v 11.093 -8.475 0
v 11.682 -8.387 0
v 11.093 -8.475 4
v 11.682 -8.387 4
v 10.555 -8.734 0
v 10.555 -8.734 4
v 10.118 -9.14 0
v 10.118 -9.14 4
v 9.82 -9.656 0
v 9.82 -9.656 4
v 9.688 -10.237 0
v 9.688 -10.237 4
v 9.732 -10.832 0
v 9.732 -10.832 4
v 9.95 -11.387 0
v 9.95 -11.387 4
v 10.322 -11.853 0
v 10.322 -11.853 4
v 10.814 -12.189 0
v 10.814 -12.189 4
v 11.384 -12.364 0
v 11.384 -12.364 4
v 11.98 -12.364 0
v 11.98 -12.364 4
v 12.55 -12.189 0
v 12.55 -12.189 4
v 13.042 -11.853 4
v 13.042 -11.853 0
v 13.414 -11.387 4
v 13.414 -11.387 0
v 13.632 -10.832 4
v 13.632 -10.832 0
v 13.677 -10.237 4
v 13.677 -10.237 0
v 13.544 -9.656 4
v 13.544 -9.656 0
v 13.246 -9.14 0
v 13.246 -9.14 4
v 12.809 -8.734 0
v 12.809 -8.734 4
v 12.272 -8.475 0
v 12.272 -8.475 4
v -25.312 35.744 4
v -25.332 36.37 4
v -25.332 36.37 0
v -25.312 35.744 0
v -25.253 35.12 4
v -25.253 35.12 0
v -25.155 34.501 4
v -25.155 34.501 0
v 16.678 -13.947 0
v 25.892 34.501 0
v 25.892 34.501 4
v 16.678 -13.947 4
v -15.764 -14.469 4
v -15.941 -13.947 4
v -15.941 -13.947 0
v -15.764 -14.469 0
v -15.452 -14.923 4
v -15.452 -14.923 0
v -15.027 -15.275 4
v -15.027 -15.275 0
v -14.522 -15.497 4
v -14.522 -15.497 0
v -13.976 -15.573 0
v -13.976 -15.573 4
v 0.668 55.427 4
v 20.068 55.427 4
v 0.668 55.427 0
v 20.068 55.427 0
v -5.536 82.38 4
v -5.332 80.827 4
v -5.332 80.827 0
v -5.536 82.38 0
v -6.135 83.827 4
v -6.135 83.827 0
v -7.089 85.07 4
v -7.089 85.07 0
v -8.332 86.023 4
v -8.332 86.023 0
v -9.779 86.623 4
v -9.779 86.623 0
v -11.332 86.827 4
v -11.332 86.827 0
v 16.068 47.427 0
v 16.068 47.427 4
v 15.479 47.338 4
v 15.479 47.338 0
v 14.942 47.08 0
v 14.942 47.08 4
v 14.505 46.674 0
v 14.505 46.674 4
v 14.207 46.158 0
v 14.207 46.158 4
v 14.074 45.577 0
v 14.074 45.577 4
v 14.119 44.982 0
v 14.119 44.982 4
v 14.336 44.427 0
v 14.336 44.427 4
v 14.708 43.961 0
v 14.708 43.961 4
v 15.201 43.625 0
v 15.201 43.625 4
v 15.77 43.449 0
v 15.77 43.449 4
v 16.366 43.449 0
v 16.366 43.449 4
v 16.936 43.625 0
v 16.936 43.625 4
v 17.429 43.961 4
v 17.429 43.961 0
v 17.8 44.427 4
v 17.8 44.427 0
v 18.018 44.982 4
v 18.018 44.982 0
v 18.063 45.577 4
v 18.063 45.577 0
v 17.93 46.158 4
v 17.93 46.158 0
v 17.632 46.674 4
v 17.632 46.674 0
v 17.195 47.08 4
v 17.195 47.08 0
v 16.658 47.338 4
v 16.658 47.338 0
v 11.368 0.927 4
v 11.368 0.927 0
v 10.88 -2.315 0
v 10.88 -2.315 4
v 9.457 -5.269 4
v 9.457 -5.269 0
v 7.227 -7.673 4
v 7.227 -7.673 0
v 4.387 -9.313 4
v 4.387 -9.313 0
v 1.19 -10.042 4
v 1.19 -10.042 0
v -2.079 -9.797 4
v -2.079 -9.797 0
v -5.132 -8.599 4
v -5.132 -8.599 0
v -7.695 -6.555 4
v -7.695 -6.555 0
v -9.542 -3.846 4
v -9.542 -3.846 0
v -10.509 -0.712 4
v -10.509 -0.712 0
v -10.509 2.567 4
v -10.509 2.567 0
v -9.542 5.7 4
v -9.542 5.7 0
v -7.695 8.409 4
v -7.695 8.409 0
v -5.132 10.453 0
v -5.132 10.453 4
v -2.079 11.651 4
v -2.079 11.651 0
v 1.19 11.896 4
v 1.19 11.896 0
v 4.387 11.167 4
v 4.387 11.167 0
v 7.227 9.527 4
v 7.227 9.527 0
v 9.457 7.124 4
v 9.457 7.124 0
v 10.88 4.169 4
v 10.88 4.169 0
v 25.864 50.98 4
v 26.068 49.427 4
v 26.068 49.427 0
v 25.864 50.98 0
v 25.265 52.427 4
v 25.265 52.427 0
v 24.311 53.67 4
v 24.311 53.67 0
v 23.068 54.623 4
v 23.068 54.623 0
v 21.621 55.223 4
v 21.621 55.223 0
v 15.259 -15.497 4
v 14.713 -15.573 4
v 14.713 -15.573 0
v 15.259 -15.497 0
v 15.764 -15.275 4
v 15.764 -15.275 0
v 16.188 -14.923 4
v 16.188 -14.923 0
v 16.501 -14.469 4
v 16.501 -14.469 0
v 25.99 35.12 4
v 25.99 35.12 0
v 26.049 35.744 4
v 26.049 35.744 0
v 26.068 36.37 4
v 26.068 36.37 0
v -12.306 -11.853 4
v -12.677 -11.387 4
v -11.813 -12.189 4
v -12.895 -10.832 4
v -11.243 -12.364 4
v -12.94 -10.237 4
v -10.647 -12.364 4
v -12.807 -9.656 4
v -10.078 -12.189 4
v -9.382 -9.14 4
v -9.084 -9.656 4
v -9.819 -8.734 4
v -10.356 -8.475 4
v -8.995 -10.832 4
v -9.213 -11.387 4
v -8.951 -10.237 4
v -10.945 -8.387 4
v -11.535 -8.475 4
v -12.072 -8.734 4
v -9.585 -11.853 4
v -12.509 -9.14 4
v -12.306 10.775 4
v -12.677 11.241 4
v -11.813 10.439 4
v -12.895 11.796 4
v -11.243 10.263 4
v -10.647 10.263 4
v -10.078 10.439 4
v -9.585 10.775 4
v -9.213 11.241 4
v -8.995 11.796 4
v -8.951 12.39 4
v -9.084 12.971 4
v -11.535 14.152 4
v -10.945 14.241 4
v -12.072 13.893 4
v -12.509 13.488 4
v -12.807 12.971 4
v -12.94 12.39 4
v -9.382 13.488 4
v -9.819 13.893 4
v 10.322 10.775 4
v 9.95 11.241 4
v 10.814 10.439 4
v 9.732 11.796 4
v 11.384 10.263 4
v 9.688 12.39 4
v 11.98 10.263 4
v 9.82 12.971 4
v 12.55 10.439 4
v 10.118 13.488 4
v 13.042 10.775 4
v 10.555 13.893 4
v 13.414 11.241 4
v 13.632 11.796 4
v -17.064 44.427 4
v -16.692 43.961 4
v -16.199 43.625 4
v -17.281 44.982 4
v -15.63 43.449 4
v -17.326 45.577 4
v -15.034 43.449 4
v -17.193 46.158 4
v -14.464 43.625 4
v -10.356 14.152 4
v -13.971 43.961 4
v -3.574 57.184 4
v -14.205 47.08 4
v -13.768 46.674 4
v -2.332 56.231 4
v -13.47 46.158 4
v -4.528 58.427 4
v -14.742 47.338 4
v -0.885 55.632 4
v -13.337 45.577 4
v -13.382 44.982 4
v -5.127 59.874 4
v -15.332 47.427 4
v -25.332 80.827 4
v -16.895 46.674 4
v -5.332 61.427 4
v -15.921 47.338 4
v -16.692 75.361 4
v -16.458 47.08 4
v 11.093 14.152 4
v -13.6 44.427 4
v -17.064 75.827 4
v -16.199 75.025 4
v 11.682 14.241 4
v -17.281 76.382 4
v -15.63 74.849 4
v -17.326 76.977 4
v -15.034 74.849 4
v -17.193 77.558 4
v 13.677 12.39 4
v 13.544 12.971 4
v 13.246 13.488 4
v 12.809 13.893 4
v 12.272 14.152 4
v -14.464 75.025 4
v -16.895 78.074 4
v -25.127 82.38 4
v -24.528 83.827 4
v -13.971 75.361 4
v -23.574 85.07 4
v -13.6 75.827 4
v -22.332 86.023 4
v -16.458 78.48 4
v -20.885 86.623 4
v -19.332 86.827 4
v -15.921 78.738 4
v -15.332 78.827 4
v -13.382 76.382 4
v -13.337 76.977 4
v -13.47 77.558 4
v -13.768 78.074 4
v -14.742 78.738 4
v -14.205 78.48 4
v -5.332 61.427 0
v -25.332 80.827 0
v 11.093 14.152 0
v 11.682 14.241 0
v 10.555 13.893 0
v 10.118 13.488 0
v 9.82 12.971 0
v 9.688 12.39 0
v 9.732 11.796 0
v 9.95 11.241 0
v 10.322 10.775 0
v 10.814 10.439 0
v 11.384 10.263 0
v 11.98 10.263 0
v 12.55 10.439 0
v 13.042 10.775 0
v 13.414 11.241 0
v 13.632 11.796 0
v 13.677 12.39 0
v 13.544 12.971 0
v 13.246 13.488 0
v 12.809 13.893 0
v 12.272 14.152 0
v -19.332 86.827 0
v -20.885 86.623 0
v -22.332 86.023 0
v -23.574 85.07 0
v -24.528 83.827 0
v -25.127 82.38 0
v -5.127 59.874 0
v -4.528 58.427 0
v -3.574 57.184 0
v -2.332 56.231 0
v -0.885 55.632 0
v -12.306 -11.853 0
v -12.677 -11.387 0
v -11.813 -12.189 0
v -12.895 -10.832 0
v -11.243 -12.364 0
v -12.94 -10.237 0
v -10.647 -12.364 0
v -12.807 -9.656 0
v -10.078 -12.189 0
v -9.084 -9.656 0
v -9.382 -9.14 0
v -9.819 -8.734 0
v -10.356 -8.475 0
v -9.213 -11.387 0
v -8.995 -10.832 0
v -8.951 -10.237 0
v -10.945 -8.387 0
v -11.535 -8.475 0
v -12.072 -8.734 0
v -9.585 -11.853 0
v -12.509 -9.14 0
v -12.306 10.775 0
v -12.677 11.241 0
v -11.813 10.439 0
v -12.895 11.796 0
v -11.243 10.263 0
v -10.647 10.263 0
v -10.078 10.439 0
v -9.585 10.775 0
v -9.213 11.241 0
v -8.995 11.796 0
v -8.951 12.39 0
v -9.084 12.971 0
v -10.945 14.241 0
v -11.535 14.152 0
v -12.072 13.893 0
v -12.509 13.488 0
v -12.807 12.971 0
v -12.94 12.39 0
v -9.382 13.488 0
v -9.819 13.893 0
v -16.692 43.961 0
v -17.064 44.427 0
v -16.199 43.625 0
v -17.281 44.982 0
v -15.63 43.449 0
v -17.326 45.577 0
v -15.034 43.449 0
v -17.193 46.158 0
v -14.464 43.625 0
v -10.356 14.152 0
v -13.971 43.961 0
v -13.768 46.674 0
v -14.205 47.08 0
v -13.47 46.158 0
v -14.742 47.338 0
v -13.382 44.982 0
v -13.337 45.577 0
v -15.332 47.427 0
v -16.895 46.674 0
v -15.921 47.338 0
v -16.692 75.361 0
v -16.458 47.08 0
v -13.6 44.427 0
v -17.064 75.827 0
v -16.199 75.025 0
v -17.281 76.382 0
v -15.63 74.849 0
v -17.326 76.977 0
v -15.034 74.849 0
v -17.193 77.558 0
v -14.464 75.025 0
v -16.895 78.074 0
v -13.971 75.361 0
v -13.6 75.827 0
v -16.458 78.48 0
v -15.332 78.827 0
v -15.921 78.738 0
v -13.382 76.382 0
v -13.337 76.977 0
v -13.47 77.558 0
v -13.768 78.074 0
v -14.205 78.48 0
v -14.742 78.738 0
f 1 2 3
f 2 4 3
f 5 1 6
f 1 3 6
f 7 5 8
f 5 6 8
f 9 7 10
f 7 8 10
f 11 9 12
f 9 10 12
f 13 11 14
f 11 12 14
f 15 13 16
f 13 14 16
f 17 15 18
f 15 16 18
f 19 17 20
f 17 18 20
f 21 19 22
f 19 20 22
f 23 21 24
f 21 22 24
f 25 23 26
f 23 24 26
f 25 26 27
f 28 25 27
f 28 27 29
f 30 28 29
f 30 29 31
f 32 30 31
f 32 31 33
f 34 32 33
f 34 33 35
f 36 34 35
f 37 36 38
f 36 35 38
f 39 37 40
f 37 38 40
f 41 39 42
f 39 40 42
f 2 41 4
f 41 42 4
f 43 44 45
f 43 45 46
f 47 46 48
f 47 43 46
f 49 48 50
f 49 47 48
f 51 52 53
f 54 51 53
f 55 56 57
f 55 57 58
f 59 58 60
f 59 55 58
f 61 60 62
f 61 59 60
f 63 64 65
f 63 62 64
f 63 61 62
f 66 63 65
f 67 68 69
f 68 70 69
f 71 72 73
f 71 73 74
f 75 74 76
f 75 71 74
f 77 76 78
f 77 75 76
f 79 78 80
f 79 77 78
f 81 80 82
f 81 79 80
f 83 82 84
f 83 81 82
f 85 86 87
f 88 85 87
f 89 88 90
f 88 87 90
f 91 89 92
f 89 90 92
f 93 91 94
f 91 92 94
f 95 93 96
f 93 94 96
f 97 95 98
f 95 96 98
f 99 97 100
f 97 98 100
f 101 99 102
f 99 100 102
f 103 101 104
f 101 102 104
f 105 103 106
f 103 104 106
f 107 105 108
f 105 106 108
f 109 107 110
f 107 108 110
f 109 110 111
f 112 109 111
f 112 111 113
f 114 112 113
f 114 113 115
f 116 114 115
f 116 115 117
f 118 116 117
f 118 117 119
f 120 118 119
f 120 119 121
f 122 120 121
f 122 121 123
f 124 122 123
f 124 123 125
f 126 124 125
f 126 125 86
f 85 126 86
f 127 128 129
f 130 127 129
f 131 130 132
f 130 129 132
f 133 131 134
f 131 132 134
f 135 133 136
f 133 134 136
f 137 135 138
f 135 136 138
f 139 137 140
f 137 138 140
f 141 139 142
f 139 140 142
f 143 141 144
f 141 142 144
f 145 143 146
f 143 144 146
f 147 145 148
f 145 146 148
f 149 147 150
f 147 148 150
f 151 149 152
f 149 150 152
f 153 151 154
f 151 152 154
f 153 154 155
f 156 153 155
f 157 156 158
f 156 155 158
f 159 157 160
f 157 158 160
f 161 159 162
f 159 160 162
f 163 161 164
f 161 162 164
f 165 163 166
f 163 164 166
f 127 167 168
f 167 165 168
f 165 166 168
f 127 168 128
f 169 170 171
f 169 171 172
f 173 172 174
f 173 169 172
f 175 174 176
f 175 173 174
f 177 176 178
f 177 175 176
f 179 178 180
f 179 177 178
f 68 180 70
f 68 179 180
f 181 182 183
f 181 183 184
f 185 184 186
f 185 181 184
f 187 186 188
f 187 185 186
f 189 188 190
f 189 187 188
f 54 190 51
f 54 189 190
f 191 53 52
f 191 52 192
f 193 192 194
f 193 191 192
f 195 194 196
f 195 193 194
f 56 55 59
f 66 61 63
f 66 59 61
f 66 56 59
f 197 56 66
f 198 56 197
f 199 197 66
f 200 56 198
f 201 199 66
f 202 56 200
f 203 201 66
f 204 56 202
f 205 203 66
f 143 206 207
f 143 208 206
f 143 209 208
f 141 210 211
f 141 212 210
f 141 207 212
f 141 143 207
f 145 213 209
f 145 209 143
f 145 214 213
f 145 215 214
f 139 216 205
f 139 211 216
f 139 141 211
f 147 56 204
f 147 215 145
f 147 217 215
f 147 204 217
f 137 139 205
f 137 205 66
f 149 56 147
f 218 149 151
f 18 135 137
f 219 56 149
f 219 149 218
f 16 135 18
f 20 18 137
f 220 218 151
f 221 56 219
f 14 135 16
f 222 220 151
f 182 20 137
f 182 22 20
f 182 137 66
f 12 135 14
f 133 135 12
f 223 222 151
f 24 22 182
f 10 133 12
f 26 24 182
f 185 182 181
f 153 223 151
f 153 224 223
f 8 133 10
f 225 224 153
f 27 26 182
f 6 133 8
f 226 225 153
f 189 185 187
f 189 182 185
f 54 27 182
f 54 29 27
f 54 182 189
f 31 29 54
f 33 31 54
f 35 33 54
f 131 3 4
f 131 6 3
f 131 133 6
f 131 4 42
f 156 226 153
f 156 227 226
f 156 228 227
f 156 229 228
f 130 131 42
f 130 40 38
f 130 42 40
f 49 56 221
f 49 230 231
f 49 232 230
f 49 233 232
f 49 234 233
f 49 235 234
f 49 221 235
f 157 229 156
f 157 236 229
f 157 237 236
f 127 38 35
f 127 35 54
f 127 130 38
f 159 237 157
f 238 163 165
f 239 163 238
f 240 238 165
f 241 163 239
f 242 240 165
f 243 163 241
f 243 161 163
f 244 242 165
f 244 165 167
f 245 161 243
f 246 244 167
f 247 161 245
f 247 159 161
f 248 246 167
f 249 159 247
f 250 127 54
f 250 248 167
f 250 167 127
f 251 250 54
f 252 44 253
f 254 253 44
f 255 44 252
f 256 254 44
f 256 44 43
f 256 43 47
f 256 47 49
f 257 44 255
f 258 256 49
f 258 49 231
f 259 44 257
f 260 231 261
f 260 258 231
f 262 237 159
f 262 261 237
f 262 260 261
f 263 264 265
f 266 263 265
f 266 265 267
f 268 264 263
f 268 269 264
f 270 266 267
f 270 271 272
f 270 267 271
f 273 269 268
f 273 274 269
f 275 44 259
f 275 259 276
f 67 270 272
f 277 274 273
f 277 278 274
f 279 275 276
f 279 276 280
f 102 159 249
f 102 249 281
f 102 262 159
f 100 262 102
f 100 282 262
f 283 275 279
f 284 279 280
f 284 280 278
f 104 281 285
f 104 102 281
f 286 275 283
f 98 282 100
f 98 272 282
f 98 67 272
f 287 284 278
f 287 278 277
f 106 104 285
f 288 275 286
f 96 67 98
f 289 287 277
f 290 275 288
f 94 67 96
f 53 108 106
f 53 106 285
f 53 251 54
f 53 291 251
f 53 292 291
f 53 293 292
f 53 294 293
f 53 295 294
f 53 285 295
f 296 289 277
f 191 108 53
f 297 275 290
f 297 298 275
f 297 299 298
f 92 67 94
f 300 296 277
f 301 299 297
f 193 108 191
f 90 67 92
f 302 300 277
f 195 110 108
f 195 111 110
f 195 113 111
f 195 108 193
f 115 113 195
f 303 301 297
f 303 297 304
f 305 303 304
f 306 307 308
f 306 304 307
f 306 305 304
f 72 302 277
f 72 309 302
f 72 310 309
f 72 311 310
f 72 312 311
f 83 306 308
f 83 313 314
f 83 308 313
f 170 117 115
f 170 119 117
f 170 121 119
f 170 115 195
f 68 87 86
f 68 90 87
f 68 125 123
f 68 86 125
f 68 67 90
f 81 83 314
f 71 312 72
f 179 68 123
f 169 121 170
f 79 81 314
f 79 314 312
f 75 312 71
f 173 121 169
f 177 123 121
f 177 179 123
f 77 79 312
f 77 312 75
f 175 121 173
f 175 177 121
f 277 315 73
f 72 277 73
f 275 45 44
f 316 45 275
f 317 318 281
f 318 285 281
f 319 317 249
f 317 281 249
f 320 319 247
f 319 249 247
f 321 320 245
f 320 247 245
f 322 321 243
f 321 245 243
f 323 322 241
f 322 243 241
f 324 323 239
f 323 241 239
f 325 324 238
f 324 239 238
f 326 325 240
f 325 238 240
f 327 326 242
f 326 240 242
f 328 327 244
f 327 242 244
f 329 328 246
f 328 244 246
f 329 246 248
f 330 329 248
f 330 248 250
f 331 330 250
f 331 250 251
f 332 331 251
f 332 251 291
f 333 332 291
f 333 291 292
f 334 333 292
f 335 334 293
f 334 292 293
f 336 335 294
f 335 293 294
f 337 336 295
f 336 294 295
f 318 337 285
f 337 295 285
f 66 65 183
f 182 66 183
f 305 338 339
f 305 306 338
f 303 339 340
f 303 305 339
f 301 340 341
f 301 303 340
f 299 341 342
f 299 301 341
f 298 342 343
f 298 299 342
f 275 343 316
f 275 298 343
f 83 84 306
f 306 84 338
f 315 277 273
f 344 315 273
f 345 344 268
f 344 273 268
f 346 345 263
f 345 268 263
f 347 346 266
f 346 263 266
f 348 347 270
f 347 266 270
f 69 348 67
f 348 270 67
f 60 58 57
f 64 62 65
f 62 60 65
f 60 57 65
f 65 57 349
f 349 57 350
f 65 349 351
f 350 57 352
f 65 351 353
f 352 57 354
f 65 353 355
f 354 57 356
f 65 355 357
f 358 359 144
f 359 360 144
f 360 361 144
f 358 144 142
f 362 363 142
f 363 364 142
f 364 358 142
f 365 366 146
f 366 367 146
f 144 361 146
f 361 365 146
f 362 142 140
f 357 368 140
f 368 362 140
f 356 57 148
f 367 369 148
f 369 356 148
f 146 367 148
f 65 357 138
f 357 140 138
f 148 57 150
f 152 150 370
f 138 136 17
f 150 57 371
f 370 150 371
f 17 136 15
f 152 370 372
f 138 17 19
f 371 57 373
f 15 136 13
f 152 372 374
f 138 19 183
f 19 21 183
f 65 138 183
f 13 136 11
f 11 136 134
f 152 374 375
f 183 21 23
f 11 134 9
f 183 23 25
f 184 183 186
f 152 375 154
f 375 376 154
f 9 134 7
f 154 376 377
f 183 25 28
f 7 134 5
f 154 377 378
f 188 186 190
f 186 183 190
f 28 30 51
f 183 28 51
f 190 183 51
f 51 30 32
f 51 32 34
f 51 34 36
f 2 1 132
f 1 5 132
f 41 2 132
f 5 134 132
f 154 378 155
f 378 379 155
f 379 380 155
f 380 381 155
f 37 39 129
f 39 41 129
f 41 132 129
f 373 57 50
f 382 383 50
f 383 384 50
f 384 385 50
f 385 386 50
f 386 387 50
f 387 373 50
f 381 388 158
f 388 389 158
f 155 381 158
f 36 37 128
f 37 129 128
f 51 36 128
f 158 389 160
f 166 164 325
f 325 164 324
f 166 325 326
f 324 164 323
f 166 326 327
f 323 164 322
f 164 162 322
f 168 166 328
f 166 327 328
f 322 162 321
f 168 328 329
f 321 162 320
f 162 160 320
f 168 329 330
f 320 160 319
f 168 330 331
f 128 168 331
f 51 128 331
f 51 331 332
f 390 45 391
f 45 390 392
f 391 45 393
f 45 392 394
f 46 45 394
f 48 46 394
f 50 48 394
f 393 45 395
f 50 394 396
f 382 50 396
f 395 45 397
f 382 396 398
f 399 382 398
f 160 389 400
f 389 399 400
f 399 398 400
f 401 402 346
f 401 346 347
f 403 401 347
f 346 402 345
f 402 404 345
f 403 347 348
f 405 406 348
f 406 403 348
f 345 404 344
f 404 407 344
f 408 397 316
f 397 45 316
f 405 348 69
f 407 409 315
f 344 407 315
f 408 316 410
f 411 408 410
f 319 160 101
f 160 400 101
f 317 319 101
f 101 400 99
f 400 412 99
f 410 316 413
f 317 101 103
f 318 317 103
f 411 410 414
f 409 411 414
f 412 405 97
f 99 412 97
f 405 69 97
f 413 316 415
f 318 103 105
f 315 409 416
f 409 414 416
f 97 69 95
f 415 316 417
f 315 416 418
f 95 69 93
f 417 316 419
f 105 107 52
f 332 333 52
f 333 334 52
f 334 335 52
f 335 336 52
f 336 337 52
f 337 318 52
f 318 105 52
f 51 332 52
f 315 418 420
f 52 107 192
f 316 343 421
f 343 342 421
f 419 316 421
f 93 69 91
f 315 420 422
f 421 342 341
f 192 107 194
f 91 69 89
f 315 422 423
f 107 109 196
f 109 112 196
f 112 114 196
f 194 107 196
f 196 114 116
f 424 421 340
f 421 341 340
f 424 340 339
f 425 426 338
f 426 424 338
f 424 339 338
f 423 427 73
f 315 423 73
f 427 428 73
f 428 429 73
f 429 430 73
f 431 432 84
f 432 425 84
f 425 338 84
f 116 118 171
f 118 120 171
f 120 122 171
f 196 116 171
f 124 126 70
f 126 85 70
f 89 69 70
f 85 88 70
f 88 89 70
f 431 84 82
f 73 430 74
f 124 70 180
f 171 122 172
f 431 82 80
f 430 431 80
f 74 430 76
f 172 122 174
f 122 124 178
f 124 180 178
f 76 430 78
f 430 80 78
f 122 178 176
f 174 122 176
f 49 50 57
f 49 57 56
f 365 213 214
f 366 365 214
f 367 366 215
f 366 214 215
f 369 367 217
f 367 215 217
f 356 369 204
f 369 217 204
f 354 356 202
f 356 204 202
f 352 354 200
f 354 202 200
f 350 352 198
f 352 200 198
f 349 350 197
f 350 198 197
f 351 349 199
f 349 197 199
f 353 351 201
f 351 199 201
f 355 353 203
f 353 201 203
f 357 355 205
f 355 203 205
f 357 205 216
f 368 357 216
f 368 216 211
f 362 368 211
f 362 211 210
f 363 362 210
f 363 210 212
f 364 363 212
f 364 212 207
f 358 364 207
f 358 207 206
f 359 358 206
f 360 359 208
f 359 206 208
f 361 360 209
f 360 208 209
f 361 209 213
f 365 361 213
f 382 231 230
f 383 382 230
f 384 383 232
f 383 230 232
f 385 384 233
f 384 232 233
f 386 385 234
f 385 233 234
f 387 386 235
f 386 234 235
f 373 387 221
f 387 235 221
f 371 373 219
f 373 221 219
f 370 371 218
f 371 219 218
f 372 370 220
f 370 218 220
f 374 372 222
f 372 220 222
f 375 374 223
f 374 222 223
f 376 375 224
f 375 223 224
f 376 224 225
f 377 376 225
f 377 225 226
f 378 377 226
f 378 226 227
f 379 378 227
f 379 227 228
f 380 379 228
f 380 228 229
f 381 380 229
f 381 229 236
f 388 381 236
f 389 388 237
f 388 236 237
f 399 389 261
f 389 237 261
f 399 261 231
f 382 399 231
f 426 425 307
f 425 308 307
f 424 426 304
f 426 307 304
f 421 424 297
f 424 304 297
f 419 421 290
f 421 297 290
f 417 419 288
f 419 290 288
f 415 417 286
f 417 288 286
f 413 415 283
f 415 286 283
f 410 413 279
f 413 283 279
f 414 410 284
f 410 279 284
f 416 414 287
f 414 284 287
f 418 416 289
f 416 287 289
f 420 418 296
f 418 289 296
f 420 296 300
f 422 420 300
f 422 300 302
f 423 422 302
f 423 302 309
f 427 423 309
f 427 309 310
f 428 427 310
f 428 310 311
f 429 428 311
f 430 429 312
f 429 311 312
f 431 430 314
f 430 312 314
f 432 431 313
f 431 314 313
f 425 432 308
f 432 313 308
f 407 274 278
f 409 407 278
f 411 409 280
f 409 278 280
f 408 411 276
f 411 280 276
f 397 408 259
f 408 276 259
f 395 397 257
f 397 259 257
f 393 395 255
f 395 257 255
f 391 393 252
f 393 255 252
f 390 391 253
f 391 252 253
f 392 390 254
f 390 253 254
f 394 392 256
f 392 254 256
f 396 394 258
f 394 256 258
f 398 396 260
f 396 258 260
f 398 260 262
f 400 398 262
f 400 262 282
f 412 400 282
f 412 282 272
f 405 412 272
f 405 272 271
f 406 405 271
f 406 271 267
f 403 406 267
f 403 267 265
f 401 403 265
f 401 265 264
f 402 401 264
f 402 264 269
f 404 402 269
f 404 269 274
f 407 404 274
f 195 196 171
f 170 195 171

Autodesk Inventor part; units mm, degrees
ref_plane "YZ Plane" through (0, 0, 0) normal (1, 0, 0) x (0, 1, 0)
ref_plane "XZ Plane" through (0, 0, 0) normal (0, 1, 0) x (-1, 0, 0)
ref_plane "XY Plane" through (0, 0, 0) normal (0, 0, 1) x (1, 0, 0)
sketch "Szkic1" plane through (0, 0, 0) normal (0, 0, 1) x (1, 0, 0)
  line L0 (-25.3316, -15.5729) -> (26.0684, -15.5729)
  line L1 (26.0684, -15.5729) -> (26.0684, 35.4271)
  line L2 (26.0684, 35.4271) -> (26.0684, 35.4271)
  line L3 (26.0684, 35.4271) -> (26.0684, 55.4271)
  line L4 (26.0684, 55.4271) -> (-5.3316, 55.4271)
  line L5 (-5.3316, 55.4271) -> (-5.3316, 86.8271)
  line L6 (-5.3316, 86.8271) -> (-25.3316, 86.8271)
  line L7 (-25.3316, -15.5729) -> (-25.3316, 86.8271)
  line L8 (-15.6316, 16.9271) -> (16.3684, 16.9271)
  line L9 (16.3684, 16.9271) -> (16.3684, -15.0729)
  line L10 (16.3684, -15.0729) -> (-15.6316, -15.0729)
  line L11 (-15.6316, -15.0729) -> (-15.6316, 16.9271)
  circle A0 centre (0.3684, 0.9271) radius 11
  circle A1 centre (0.3684, 0.9271) radius 16
  point P0 (0, 0)
  point P1 (-10.9453, 12.2408)
  point P2 (11.6821, 12.2408)
  point P3 (11.6821, -10.3866)
  point P4 (-10.9453, -10.3866)
  point P5 (16.0684, 45.4271)
  point P6 (-15.3316, 76.8271)
  point P7 (-15.3316, 45.4271)
  dimension "d0" = 20
  dimension "d1" = 20
  dimension "d2" = 51.4
  dimension "d3" = 51.4
  dimension "d4" = 34.5
  dimension "d5" = 25.7
  dimension "d6" = 51.4
  dimension "d7" = 51
  dimension "d8" = 32
  dimension "d9" = 32
  dimension "d10" = 16
  dimension "d11" = 16
  dimension "d12" = 22
  dimension "d13" = 32
  dimension "d23" = 10
  dimension "d24" = 10
  dimension "d25" = 10
  dimension "d26" = 10
  dimension "d27" = 10
  dimension "d28" = 10
extrude "Wyciągnięcie proste1" add sketch "Szkic1" along normal blind 4 contours L7 L6 L5 L4 L3 L1 L0 | L8 A1 L11 | L8 L9 A1 | A1 | A1 L10 L11 | L9 L10 A1
hole "Otwór1" at (0.3684, 0.9271, 0) at (-10.9453, 12.2408, 0) at (11.6821, 12.2408, 0) at (11.6821, -10.3866, 0) at (-10.9453, -10.3866, 0) direction (0, 0, 1) diameter 4 end through all
hole "Otwór2" at (16.0684, 45.4271, 0) at (-15.3316, 76.8271, 0) at (-15.3316, 45.4271, 0) direction (0, 0, 1) diameter 4 end through all
chamfer "Faza1" distance 51 distance2 9.7 1 edges at (-25.3316, -15.5729, 2) measured on face at (-25.3316, 18.5605, 1.3333)
chamfer "Faza2" distance 51 distance2 9.7 1 edges at (26.0684, -15.5729, 2) measured on face at (26.0684, 31.7605, 1.3333)
fillet "Zaokrąglenie1" radius 2 2 edges at (-15.6316, -15.5729, 2) (16.3684, -15.5729, 2)
fillet "Zaokrąglenie2" radius 6 4 edges at (-5.3316, 55.4271, 2) (26.0684, 55.4271, 2) (-5.3316, 86.8271, 2) (-25.3316, 86.8271, 2)
fillet "Zaokrąglenie3" radius 10 2 edges at (-25.3316, 35.4271, 2) (26.0684, 35.4271, 2)
equation "\"d1\" = d0"
equation "\"d2\" = d6"
equation "\"d3\" = d6"
equation "\"d6\" = 2 * d5"
equation "\"d10\" = 0.5 * d9"
equation "\"d11\" = 0.5 * d8"
equation "\"d25\" = 0.5 * d1"
equation "\"d26\" = 0.5 * d0"
equation "\"d27\" = d25"
equation "\"d28\" = d26"
properties part number "LC_ALU_4mm_Heatbed_Frame_Linear_Bearing_Mounting_Bracket"
